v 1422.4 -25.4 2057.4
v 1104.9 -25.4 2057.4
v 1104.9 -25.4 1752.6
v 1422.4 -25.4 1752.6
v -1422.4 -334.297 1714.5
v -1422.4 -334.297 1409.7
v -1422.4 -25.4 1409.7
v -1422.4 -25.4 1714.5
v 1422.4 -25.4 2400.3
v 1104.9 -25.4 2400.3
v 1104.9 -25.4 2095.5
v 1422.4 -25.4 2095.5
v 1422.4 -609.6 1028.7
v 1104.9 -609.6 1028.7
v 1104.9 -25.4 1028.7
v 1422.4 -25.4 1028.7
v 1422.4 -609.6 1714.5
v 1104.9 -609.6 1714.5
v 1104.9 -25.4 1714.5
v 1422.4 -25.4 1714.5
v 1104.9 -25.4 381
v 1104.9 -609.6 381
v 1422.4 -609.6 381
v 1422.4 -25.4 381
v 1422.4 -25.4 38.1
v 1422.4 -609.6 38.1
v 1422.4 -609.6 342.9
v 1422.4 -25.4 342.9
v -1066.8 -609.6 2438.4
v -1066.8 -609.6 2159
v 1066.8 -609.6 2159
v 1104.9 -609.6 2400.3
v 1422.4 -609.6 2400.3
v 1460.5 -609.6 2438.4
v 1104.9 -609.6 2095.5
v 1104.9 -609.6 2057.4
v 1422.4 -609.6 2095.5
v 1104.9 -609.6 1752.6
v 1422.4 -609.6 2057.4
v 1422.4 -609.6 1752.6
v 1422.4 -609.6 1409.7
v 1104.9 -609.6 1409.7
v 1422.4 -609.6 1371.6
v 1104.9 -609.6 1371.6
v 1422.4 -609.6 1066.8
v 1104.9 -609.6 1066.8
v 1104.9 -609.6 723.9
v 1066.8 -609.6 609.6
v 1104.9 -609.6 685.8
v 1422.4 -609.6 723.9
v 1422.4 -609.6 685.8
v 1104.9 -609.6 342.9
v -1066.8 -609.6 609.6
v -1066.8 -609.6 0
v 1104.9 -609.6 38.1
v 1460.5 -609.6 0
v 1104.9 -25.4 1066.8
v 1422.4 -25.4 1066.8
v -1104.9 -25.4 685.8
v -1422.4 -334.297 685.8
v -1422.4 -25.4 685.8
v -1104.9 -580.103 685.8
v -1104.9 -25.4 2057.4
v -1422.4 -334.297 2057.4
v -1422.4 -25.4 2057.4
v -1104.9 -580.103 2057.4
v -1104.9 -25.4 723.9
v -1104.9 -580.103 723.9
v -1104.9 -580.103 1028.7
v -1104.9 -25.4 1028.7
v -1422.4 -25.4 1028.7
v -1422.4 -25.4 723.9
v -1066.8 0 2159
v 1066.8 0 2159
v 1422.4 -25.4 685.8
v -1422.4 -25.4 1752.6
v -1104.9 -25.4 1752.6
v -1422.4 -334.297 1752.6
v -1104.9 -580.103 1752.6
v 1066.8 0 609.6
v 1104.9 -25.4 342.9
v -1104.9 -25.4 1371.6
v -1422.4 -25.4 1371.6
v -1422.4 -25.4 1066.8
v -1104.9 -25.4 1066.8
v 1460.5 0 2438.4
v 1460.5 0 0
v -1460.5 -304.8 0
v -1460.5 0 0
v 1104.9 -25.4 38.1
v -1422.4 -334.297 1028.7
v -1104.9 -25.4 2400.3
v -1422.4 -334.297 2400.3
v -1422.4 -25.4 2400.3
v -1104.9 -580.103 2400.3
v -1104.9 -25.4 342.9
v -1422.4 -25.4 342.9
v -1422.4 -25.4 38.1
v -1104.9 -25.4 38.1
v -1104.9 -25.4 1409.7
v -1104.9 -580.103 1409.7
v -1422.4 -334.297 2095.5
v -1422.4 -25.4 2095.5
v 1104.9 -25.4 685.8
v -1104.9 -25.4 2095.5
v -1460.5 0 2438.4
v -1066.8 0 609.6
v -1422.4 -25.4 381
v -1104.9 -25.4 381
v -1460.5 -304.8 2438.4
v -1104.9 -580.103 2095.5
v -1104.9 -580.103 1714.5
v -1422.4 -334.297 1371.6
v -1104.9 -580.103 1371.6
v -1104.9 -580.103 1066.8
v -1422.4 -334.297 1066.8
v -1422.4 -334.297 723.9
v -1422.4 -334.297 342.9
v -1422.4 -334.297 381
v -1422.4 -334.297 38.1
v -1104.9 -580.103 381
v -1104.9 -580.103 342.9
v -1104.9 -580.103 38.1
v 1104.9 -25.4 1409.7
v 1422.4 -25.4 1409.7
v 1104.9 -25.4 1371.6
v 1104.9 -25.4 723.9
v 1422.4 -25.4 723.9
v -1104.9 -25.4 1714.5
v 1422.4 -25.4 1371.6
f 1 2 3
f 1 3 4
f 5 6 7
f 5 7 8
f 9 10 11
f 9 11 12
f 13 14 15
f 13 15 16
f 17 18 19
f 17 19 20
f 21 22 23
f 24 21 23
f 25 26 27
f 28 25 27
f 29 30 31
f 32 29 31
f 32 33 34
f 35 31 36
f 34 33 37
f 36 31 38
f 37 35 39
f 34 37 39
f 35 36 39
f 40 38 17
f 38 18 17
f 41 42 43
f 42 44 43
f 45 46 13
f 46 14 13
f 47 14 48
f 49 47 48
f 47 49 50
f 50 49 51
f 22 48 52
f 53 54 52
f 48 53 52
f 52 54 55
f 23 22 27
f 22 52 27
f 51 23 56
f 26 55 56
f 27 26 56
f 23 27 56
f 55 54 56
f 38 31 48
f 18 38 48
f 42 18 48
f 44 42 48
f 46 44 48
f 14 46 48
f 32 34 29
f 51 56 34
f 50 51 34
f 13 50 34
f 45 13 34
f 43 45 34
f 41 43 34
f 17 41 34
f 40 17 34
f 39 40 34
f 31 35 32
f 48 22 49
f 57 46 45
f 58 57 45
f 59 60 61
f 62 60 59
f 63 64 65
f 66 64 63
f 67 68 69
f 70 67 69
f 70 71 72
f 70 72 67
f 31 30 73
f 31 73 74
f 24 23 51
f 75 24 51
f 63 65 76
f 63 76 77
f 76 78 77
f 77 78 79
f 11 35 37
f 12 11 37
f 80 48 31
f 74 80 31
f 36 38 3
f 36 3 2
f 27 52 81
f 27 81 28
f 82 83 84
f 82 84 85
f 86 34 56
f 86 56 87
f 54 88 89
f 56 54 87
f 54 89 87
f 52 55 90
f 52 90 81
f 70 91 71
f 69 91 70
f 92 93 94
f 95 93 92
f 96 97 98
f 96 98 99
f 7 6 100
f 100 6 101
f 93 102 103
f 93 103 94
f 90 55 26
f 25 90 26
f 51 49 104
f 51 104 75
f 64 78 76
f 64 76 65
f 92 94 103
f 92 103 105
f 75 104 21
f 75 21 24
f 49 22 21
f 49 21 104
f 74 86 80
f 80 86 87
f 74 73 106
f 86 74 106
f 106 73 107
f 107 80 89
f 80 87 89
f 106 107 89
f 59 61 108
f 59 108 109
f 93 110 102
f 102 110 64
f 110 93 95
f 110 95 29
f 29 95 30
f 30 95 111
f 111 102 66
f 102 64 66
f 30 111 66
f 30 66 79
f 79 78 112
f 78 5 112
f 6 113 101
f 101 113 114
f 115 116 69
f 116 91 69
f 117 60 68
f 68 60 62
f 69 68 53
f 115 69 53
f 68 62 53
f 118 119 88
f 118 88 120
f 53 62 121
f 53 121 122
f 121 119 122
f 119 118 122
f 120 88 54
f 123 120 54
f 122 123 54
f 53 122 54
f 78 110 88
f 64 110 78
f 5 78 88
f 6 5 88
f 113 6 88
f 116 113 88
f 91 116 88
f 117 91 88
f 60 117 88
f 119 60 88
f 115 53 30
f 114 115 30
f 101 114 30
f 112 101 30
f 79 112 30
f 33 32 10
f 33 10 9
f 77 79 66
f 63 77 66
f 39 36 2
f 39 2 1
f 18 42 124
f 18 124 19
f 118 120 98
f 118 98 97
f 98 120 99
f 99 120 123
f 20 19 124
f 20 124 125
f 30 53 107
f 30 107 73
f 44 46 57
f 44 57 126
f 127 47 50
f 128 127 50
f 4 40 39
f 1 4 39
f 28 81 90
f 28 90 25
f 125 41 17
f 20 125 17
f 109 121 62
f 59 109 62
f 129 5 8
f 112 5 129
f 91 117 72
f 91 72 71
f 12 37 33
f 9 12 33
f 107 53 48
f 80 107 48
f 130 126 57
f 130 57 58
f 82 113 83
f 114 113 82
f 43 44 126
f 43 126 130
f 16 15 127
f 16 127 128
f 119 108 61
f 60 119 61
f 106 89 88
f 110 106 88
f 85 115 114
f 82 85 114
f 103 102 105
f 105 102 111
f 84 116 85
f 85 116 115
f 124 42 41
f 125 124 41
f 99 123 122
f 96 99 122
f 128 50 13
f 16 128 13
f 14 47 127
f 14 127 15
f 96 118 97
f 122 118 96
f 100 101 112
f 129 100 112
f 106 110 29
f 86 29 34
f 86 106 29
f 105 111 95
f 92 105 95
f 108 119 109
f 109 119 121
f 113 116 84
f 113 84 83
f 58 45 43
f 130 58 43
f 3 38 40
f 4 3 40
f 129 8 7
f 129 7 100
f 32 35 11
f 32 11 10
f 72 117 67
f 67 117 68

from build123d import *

# Parameters (mm, degrees)
F1_DEPTH = 2438.4
F2_W     = 2133.6
F2_H     = 1549.4
F3_DEPTH = 609.6
F4_W     = 317.5
F4_H     = 304.8
F5_DEPTH = 584.2


with BuildPart() as f1:
    # F0 (on Top) → F1 (new body)
    with BuildSketch(Plane.XY):
        Polygon((1460.5, 0), (-1460.5, 0), (-1460.5, -304.8), (-1066.8, -609.6), (0, -609.6), (1460.5, -609.6), (1460.5, -304.8), align=None)
    extrude(amount=F1_DEPTH)

    # F2 (on face) → F3 (cut)
    with BuildSketch(Plane.XZ.offset(609.6)):
        with Locations((0, 1384.3)):
            Rectangle(F2_W, F2_H)
    extrude(amount=-F3_DEPTH, mode=Mode.SUBTRACT)

    # F4 (on face) → F5 (cut)
    with BuildSketch(Plane.XZ.offset(609.6)):
        with Locations((1263.65, 190.5)):
            Rectangle(F4_W, F4_H)
        with Locations((1263.65, 876.3)):
            Rectangle(F4_W, F4_H)
        with Locations((1263.65, 533.4)):
            Rectangle(F4_W, F4_H)
        with Locations((1263.65, 1219.2)):
            Rectangle(F4_W, F4_H)
        with Locations((1263.65, 1562.1)):
            Rectangle(F4_W, F4_H)
        with Locations((1263.65, 1905)):
            Rectangle(F4_W, F4_H)
        with Locations((1263.65, 2247.9)):
            Rectangle(F4_W, F4_H)
        with Locations((-1263.65, 2247.9)):
            Rectangle(F4_W, F4_H)
        with Locations((-1263.65, 533.4)):
            Rectangle(F4_W, F4_H)
        with Locations((-1263.65, 1905)):
            Rectangle(F4_W, F4_H)
        with Locations((-1263.65, 190.5)):
            Rectangle(F4_W, F4_H)
        with Locations((-1263.65, 876.3)):
            Rectangle(F4_W, F4_H)
        with Locations((-1263.65, 1562.1)):
            Rectangle(F4_W, F4_H)
        with Locations((-1263.65, 1219.2)):
            Rectangle(F4_W, F4_H)
    extrude(amount=-F5_DEPTH, mode=Mode.SUBTRACT)


solid = f1.part
